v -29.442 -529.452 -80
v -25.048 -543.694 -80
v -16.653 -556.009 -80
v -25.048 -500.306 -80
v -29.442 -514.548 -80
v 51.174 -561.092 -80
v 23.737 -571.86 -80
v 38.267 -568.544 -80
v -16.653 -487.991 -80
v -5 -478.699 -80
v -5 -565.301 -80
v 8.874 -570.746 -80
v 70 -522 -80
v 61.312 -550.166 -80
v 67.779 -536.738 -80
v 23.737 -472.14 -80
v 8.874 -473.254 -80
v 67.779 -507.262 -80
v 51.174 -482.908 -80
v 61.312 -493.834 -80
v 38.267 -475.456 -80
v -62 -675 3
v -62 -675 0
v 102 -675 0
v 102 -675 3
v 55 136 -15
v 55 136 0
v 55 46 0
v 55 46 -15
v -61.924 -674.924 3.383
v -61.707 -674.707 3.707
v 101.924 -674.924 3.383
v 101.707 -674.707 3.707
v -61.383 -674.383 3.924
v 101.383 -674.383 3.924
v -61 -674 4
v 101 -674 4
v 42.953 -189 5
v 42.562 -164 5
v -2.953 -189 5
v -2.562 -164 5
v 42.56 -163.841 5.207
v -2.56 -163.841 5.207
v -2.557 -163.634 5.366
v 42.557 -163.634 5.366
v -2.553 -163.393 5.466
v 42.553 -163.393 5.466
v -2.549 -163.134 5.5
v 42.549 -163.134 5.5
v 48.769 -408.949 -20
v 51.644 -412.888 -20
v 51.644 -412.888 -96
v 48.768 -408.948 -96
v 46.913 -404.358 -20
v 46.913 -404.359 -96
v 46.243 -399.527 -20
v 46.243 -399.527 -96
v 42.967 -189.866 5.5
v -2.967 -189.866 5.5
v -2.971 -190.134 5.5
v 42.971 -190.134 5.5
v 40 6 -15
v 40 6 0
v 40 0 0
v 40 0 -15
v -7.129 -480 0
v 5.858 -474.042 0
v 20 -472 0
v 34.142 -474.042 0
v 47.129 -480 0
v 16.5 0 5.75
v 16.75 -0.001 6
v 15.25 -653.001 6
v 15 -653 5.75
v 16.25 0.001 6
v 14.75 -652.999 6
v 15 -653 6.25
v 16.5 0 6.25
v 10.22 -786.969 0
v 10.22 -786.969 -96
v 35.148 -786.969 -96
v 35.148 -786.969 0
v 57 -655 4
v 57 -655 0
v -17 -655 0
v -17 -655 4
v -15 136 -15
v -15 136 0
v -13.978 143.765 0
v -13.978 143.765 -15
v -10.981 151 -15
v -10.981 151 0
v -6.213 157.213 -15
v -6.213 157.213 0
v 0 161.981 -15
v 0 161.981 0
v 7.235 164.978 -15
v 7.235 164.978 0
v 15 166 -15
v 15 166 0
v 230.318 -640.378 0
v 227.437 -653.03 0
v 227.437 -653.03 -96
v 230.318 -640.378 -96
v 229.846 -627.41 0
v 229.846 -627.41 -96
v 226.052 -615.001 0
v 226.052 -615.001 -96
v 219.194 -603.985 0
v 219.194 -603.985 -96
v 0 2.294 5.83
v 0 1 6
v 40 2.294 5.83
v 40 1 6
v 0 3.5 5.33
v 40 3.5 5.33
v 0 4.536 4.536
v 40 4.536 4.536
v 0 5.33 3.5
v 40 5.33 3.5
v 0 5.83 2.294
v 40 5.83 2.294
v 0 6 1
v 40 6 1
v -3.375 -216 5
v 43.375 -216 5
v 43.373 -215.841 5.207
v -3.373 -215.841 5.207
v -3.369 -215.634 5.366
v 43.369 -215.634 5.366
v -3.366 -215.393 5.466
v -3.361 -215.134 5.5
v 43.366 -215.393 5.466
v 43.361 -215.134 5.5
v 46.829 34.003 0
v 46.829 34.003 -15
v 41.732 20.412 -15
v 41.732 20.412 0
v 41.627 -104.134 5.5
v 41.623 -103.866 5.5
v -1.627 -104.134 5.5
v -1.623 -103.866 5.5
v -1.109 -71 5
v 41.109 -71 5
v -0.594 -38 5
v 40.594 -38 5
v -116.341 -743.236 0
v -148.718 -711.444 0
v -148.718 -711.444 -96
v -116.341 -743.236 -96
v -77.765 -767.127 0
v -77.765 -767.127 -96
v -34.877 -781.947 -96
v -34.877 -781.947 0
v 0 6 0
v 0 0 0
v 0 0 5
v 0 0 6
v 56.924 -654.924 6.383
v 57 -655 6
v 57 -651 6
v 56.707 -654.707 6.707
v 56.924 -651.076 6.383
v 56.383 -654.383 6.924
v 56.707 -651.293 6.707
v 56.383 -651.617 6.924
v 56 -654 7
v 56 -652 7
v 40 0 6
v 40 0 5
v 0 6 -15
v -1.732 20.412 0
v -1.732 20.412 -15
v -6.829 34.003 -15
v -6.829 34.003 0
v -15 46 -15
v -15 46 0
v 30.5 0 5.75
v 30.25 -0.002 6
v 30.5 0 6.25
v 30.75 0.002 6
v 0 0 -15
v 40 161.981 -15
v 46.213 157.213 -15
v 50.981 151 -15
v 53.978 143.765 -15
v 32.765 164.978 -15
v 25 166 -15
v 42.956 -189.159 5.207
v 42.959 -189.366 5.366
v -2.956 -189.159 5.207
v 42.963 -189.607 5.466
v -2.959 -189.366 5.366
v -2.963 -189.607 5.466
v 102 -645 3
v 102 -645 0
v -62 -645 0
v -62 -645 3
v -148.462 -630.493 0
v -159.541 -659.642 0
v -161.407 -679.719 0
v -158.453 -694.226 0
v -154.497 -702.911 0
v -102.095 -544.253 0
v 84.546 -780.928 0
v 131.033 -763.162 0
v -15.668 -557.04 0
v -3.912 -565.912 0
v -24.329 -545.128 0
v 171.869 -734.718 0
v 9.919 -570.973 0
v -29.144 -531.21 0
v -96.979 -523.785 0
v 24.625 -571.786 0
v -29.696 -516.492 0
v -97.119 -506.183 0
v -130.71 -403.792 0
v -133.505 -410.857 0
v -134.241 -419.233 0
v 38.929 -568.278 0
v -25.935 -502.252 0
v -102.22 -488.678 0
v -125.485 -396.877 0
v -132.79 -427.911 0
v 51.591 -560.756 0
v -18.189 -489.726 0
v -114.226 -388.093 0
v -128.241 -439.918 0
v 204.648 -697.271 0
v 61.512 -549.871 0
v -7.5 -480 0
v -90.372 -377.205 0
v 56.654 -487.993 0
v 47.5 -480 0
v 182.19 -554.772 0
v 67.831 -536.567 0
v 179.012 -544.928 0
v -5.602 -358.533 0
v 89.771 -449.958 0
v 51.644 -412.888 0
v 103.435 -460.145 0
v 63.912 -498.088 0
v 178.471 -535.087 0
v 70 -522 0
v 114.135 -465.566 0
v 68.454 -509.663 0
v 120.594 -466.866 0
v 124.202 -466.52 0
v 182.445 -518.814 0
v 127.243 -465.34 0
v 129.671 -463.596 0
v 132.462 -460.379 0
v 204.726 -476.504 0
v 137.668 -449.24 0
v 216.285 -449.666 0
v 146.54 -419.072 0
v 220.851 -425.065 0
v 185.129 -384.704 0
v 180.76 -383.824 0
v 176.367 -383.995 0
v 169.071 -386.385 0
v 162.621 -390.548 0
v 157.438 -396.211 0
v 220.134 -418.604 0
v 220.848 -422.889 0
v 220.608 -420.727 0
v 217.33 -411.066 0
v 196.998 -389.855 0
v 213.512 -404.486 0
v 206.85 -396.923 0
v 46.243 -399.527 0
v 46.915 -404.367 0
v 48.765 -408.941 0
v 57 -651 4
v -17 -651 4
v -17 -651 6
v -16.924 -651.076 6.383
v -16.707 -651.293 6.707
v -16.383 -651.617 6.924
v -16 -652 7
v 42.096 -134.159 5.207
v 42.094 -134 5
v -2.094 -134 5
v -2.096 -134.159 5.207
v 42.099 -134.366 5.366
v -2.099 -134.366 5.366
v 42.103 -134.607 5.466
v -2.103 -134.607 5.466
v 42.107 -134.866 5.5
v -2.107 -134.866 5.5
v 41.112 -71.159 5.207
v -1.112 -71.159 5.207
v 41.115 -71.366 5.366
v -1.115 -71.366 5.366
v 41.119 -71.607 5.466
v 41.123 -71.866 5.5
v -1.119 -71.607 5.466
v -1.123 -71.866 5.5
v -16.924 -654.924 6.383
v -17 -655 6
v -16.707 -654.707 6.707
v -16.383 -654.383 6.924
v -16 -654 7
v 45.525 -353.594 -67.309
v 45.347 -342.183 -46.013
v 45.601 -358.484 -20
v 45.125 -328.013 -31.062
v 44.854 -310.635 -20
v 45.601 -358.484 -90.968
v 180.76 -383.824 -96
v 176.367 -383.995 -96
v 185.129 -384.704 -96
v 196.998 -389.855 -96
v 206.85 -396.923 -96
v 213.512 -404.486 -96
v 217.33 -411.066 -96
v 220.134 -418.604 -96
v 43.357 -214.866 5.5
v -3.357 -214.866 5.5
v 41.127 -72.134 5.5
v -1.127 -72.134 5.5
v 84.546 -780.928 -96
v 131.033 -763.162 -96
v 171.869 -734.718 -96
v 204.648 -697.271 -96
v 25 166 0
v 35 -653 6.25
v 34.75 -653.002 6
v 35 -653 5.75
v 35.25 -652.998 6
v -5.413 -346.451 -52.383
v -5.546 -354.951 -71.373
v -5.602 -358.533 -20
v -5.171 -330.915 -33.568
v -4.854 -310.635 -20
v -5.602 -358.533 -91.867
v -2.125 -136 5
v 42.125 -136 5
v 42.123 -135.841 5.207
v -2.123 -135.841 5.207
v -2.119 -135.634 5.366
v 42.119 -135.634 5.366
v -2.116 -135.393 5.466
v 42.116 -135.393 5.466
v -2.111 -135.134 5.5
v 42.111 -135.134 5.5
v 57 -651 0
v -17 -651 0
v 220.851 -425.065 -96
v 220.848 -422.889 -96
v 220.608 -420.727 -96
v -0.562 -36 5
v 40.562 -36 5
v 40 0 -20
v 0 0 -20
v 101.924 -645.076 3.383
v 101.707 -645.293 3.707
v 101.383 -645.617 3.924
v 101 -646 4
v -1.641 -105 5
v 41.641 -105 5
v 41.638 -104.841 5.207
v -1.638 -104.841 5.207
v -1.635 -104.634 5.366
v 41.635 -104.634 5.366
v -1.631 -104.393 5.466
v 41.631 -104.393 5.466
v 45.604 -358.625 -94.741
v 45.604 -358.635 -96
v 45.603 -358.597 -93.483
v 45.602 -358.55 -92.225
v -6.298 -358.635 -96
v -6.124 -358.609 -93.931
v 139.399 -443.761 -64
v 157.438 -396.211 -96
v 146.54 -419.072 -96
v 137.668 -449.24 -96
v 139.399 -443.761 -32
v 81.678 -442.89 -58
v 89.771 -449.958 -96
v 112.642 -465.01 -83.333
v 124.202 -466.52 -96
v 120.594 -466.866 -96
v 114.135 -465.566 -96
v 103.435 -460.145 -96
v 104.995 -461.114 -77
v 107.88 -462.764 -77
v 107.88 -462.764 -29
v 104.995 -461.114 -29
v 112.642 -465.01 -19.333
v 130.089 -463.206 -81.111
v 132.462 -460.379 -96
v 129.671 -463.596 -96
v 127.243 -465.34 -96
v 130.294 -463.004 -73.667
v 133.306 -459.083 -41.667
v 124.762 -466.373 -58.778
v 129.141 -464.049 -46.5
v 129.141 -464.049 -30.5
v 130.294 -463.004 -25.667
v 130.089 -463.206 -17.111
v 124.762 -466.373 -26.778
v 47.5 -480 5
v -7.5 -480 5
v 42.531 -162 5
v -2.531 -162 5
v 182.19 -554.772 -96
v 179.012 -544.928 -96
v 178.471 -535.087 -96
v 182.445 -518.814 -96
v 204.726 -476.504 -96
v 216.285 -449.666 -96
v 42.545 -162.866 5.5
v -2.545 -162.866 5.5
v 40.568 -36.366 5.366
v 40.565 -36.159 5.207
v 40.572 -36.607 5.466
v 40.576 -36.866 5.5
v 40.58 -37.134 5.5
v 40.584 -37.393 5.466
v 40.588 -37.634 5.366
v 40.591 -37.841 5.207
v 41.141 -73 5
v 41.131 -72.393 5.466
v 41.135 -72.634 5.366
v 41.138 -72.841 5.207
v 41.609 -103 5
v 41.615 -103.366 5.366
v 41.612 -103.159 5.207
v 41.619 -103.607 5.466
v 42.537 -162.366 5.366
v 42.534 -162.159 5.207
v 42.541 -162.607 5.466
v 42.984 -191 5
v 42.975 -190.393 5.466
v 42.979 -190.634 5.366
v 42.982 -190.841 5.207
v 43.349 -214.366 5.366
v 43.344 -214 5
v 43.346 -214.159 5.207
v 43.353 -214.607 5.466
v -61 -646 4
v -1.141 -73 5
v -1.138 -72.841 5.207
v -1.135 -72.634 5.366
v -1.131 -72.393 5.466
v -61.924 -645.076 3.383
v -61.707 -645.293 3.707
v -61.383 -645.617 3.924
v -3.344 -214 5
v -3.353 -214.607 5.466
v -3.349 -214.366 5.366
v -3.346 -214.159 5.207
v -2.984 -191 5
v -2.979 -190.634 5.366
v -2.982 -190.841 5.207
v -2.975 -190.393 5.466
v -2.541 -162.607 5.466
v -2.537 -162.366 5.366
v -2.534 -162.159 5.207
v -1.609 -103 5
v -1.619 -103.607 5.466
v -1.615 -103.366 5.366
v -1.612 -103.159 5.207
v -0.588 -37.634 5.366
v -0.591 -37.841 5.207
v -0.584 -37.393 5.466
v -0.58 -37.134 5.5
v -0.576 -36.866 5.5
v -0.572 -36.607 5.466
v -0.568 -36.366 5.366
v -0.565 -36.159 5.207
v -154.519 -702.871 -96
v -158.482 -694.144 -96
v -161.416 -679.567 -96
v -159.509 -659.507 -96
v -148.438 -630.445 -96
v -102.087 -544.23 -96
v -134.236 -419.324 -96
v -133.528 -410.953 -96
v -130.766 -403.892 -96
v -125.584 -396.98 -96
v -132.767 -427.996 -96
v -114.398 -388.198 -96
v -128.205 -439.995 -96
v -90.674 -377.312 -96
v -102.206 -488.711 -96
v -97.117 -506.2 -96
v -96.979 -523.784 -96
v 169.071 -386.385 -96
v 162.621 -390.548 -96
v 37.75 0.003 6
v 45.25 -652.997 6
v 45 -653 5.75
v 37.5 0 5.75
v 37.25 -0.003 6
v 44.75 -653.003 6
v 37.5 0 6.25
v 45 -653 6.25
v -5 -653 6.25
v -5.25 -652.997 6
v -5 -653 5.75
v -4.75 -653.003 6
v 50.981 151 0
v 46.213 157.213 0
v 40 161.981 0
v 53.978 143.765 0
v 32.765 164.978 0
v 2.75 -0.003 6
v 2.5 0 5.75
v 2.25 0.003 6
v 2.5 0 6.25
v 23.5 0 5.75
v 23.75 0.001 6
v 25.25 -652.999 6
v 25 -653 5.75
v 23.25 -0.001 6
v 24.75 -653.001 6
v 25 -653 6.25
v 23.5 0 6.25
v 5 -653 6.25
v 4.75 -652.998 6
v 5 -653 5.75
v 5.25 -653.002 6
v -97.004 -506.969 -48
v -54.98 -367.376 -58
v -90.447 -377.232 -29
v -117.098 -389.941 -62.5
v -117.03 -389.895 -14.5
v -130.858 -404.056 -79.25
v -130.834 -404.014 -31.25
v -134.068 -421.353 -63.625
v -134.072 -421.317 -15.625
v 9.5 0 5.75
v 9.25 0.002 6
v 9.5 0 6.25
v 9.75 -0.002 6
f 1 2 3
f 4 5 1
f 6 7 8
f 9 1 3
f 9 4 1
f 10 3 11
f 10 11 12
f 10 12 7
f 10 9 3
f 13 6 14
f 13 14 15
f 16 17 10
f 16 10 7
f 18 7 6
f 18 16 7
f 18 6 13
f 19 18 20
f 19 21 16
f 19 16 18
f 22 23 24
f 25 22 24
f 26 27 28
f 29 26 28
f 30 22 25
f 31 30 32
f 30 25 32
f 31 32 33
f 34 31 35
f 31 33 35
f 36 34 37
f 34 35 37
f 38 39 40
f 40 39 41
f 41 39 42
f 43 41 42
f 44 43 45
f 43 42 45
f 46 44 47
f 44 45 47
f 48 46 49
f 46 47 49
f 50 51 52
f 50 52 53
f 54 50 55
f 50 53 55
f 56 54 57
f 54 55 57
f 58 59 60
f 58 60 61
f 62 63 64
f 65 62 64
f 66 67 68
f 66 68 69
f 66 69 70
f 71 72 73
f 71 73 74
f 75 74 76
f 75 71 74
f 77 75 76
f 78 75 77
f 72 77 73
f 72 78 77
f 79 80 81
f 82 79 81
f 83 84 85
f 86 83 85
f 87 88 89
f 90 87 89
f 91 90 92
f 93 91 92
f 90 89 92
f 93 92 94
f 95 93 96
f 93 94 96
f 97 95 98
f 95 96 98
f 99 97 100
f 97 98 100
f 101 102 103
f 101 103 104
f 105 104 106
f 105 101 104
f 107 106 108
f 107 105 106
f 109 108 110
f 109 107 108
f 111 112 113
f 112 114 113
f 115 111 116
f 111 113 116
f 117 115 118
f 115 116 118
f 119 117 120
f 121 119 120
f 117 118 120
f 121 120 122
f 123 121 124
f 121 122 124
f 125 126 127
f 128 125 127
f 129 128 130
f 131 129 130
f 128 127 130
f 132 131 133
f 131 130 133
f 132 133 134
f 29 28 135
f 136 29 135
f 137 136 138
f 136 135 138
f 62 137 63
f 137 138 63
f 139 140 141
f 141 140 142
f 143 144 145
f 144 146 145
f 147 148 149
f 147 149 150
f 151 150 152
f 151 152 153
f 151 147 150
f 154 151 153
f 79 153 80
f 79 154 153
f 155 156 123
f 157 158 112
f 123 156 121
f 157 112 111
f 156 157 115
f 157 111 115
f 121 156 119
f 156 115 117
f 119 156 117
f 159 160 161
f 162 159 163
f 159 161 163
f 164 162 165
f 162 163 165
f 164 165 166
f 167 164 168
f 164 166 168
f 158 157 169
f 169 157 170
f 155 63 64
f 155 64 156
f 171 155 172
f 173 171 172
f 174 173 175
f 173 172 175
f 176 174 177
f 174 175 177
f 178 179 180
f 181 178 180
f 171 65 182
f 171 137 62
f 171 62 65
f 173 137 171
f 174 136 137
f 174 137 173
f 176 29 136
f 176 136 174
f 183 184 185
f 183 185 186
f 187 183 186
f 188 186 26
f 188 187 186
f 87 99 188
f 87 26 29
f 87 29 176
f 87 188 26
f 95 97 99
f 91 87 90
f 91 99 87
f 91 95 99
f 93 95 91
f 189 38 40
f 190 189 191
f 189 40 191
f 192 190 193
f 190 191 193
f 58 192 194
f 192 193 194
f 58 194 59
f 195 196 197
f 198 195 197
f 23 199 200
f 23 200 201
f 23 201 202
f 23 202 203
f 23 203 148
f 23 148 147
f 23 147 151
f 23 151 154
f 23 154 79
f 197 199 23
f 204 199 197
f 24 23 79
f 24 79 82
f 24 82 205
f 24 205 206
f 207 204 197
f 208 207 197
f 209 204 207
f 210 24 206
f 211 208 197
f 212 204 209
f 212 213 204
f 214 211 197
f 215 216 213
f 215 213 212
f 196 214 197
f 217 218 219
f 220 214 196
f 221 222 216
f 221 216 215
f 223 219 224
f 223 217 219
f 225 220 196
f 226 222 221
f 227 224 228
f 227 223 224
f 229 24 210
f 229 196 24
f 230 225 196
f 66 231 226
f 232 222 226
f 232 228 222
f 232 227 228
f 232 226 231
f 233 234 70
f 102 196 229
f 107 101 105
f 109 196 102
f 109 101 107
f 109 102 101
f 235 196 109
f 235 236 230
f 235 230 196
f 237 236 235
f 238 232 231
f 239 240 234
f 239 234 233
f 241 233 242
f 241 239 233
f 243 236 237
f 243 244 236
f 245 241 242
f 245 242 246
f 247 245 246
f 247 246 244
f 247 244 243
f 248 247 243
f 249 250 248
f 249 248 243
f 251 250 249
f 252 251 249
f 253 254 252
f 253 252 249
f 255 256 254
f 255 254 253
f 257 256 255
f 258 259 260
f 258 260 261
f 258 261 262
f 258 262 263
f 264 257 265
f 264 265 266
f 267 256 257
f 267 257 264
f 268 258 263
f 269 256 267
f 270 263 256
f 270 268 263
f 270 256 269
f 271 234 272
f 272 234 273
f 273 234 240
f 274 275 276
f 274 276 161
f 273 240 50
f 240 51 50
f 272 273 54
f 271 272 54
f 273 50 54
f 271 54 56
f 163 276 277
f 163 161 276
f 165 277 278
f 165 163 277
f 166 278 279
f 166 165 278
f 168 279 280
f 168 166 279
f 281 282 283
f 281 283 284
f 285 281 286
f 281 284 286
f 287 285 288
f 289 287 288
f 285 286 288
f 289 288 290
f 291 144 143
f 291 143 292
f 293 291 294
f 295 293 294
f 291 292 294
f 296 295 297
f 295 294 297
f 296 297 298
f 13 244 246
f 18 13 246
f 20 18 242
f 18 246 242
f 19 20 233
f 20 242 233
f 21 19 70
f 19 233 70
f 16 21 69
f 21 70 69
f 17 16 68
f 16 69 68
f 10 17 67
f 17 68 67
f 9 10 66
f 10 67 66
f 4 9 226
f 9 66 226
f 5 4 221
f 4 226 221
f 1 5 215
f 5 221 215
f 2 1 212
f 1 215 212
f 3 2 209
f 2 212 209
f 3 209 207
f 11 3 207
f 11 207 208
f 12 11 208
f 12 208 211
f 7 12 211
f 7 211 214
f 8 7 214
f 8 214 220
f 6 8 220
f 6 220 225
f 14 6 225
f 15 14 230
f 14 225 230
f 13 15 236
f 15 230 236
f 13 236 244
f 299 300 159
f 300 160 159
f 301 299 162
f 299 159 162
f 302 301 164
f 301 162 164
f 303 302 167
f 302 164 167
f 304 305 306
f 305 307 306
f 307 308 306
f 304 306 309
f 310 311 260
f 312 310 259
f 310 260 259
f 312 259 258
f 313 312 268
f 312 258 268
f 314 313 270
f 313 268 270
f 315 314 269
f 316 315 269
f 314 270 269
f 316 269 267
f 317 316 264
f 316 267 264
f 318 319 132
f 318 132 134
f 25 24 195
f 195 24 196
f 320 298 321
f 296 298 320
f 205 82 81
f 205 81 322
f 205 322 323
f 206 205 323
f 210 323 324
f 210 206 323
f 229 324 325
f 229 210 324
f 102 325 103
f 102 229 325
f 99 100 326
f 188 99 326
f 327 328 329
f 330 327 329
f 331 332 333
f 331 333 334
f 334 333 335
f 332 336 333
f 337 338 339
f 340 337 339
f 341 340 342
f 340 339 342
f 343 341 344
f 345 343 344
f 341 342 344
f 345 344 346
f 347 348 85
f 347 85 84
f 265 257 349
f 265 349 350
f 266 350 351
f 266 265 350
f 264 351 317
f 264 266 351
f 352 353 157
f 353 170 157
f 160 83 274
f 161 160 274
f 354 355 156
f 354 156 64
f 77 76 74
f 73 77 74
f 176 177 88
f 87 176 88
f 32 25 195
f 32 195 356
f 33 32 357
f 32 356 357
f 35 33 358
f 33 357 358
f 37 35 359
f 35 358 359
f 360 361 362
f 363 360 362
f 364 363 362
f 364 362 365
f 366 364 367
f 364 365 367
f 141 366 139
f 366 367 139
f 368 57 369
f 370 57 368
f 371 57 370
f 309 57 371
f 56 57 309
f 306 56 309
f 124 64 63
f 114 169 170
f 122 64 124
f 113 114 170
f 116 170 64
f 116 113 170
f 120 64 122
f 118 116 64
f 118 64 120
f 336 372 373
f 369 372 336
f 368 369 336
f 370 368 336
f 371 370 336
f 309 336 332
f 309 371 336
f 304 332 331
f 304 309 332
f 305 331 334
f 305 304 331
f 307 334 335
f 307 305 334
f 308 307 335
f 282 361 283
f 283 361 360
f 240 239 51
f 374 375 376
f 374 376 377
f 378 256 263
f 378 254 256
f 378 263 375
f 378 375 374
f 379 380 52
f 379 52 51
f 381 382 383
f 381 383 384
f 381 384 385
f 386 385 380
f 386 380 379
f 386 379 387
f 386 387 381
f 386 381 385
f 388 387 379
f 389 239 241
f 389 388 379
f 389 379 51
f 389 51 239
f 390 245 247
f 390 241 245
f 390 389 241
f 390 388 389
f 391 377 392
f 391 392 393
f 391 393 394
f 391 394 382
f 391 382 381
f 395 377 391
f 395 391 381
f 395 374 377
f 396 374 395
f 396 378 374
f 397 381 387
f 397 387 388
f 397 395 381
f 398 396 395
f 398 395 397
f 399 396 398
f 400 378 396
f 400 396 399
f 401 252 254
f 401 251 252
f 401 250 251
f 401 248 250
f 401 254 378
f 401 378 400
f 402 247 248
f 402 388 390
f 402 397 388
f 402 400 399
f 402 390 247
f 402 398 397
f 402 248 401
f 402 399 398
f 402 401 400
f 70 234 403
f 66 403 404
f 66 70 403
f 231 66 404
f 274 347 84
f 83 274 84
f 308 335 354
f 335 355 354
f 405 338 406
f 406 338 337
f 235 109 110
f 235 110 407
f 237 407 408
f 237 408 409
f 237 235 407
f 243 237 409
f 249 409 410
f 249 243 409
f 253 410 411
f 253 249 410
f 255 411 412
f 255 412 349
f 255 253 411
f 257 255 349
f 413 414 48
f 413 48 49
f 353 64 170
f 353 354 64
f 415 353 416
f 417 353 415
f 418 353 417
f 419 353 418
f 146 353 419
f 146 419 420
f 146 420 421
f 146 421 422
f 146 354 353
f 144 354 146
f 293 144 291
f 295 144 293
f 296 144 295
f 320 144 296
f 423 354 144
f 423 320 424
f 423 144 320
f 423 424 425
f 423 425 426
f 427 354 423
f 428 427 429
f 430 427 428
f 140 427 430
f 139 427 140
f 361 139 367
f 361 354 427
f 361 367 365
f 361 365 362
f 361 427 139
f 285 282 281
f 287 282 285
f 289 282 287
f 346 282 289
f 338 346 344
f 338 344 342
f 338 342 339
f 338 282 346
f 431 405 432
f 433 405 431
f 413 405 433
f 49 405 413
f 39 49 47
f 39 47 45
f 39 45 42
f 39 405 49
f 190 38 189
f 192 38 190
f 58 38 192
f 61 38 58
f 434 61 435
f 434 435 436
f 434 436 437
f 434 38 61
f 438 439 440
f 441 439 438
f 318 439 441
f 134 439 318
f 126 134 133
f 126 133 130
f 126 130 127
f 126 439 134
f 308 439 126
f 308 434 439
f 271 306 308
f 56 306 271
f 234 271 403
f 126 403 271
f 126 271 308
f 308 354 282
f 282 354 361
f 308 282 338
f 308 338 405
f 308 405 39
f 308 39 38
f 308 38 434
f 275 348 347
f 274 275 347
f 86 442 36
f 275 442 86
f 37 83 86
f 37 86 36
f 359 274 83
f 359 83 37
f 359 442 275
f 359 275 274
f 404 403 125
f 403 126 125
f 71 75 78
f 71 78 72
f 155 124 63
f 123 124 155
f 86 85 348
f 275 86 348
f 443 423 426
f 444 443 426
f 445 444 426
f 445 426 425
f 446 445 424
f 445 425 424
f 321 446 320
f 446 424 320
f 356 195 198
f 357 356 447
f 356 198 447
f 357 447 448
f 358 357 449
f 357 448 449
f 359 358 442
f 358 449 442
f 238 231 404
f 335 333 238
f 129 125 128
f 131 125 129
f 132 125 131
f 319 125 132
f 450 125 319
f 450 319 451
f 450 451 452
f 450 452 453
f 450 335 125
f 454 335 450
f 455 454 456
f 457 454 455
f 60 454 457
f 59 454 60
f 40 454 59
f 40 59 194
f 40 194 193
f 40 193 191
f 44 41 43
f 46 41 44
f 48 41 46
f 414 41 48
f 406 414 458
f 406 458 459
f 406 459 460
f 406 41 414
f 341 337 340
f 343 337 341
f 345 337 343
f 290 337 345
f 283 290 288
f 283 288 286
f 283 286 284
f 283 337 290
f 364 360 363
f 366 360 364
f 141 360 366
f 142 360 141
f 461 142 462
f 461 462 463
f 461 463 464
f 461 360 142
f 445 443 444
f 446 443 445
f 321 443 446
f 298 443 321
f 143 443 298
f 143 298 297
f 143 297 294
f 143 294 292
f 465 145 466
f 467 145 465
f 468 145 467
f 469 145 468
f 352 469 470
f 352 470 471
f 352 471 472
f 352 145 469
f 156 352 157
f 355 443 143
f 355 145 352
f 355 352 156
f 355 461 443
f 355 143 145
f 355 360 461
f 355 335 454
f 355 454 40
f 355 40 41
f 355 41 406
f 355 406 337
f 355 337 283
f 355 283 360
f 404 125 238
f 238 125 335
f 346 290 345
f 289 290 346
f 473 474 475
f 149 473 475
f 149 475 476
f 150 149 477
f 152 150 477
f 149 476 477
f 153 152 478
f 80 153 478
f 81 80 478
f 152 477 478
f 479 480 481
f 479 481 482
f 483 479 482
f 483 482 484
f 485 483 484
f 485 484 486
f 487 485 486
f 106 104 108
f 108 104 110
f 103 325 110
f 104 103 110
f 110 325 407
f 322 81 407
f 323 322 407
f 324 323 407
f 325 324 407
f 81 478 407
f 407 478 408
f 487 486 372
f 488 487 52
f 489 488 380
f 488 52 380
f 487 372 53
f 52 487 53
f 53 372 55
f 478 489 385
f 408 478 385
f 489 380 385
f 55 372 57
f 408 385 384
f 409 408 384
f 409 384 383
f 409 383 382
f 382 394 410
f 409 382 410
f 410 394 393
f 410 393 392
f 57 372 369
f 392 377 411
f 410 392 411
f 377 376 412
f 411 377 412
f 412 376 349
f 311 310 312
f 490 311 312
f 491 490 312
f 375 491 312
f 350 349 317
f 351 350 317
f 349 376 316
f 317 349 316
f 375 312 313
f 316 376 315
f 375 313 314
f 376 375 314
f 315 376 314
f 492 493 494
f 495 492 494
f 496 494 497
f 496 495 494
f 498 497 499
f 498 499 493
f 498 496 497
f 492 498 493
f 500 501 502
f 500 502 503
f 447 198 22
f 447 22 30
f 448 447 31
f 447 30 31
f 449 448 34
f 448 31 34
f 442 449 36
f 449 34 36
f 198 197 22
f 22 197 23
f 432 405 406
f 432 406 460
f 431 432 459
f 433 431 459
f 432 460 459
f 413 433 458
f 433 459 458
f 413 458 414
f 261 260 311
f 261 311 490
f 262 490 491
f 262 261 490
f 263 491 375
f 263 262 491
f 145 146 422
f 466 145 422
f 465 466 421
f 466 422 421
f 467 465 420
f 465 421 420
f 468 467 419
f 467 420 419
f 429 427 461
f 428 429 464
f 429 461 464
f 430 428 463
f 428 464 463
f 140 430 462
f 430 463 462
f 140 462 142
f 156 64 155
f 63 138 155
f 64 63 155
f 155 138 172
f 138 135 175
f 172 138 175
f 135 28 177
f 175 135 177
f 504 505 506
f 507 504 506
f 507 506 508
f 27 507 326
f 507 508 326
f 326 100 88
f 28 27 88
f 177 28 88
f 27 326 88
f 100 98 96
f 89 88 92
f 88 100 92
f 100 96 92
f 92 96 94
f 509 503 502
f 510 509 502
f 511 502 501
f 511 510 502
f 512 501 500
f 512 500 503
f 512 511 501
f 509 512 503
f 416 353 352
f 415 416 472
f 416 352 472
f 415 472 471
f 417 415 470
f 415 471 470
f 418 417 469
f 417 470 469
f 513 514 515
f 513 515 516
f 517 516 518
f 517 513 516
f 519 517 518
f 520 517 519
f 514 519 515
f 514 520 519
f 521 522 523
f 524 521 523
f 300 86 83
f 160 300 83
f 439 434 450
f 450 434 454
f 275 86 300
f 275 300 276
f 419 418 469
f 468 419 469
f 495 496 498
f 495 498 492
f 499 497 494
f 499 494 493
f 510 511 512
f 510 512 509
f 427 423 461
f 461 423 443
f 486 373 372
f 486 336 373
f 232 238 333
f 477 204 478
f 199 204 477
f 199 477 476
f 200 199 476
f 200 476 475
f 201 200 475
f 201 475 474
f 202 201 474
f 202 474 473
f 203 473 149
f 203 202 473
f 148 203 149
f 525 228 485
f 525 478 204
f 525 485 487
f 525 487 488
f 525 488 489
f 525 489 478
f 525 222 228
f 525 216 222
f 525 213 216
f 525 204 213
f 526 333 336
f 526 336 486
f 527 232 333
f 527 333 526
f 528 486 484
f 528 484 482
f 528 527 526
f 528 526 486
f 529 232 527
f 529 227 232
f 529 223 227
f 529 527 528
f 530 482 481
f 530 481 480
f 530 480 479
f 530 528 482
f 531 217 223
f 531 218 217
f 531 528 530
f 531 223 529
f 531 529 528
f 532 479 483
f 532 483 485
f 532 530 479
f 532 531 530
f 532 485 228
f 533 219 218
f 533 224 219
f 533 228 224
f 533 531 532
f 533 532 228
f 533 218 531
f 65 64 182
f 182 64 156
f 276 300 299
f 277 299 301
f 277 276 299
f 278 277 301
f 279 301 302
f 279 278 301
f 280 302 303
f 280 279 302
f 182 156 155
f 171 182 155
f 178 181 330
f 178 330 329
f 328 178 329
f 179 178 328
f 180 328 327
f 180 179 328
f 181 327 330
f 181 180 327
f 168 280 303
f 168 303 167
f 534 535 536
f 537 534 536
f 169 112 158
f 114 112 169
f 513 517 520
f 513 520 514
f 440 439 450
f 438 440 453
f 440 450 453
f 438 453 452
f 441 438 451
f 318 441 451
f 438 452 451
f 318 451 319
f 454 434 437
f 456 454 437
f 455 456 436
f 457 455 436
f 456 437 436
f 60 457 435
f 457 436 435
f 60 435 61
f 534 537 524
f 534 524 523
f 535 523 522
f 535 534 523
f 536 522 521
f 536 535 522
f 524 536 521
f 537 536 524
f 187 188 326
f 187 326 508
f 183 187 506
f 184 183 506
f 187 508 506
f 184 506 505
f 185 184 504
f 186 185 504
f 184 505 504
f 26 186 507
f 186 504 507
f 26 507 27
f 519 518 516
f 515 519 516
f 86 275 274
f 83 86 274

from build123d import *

# Parameters (mm, degrees)
BOSS_EXTRUDE1_DEPTH  = 20
BOSS_EXTRUDE2_DEPTH  = 96
FILLET3_R            = 20
BOSS_EXTRUDE3_DEPTH  = 5
BOSS_EXTRUDE4_DEPTH  = 96
CHAMFER1_SIZE        = 48
CUT_EXTRUDE1_DEPTH   = 55
SKETCH28_R           = 50
CUT_EXTRUDE14_DEPTH  = 80
BOSS_EXTRUDE18_DEPTH = 0.5
FILLET31_R           = 1
SKETCH32_W           = 40
SKETCH32_H           = 6
BOSS_EXTRUDE19_DEPTH = 1
SKETCH33_W           = 40
SKETCH33_H           = 6
BOSS_EXTRUDE20_DEPTH = 5
FILLET32_R           = 5
BOSS_EXTRUDE21_DEPTH = 4
SKETCH35_W           = 74
SKETCH35_H           = 4
BOSS_EXTRUDE22_DEPTH = 3
FILLET33_R           = 1
FILLET34_R           = 1
BOSS_EXTRUDE23_DEPTH = 15
SWEEP9_PROFILE_R     = 0.25
SWEEP14_PROFILE_R    = 0.25
SWEEP15_PROFILE_R    = 0.25
SWEEP16_PROFILE_R    = 0.25
SWEEP17_PROFILE_R    = 0.25
SWEEP18_PROFILE_R    = 0.25


with BuildPart() as part:
    # Sketch1 → Boss-Extrude1 (new body)
    with BuildSketch(Plane.XY):
        Polygon((40, 0), (0, 0), (-7.5, -480), (0, -480), (20, -480), (40, -480), (47.5, -480), align=None)
    extrude(amount=-BOSS_EXTRUDE1_DEPTH)

    # Sketch2 → Boss-Extrude2 (add)
    with BuildSketch(Plane.XY):
        with BuildLine():
            Line((10.219610861, -786.968604214), (35.14770821, -786.968604214))
            ThreePointArc((35.14770821, -786.968604214), (152.317235778, -750.183650537), (227.437244868, -653.030085282))
            ThreePointArc((227.437244868, -653.030085282), (229.845672292, -627.410065854), (219.193591135, -603.98531217))
            add(Edge.make_bspline(
                [(219.193591135, -603.98531217), (202.390568913, -583.503251259), (147.151942297, -529.611408553), (218.152428529, -476.200616028), (220.851380358, -425.0648756)],
                knots=[0.199231014, 0.199231014, 0.199231014, 0.199231014, 0.323150604, 0.537684641, 0.537684641, 0.537684641, 0.537684641], degree=3))
            ThreePointArc((220.851380358, -425.0648756), (220.757173483, -421.804982868), (220.134421907, -418.603739978))
            add(Edge.make_bspline(
                [(176.366999248, -383.995427543), (180.66359913, -383.177159069), (200.057343412, -388.929095367), (215.470049543, -401.99312039), (220.134421907, -418.603739978)],
                knots=[0.180916706, 0.180916706, 0.180916706, 0.180916706, 0.355528149, 0.960011037, 0.960011037, 0.960011037, 0.960011037], degree=3))
            ThreePointArc((176.366999248, -383.995427543), (165.712415207, -388.258961345), (157.438208459, -396.211029268))
            add(Edge.make_bspline(
                [(157.438208459, -396.211029268), (126.925707927, -439.608771107), (154.816116558, -524.862903433), (46.362546103, -407.202950609)],
                knots=[0.793265859, 0.793265859, 0.793265859, 0.793265859, 1, 1, 1, 1], degree=3))
            Line((46.362546103, -407.202950609), (45.60131722, -358.484302107))
            Line((45.60131722, -358.484302107), (-5.264752066, -358.484302107))
            add(Edge.make_bspline(
                [(-5.264752066, -358.484302107), (-217.82456269, -389.343935587), (15.057561493, -504.241037009), (-198.228031957, -649.372190009), (-148.717501724, -711.44444846)],
                knots=[0, 0, 0, 0, 0.481381152, 1, 1, 1, 1], degree=3))
            ThreePointArc((-148.717501724, -711.44444846), (-77.764626164, -767.127384819), (10.219610861, -786.968604214))
        make_face()
    extrude(amount=-BOSS_EXTRUDE2_DEPTH)

    # Fillet3
    fillet3_edges = [part.edges().sort_by_distance(p)[0] for p in [
        (46.362546103, -407.202950609, -48),
    ]]
    fillet(fillet3_edges, radius=FILLET3_R)

    # Sketch4 → Boss-Extrude3 (add)
    with BuildSketch(Plane.XY):
        Polygon((-7.5, -480), (0, 0), (40, 0), (47.5, -480), align=None)
    extrude(amount=BOSS_EXTRUDE3_DEPTH)

    # Sketch5 → Boss-Extrude4 (add)
    with BuildSketch(Plane.XY):
        Polygon((45.60131722, -358.484302107), (-5.264752066, -358.484302107), (-5.602083381, -358.533336367), (-4.853669592, -310.634853862), (44.853669592, -310.634853862), align=None)
    extrude(amount=-BOSS_EXTRUDE4_DEPTH)

    # Chamfer1
    # the kernel refuses this chamfer: 48 mm, written as the material it takes off along each edge
    with BuildSketch(Plane(origin=(-128.294453014, -310.634853862, -96), x_dir=(0, -0.9996219169112968, -0.02749587661058648), z_dir=(1, 0, 0))) as chamfer1_piece_1:
        Polygon((CHAMFER1_SIZE * 0.999621916911, -CHAMFER1_SIZE * 0.0274958766106), (-CHAMFER1_SIZE * 0.0274958766106, -CHAMFER1_SIZE * 0.999621916911), (0, 0), align=None)
    extrude(amount=296.588906028, mode=Mode.SUBTRACT)

    # Sketch7 → Cut-Extrude1 (cut, symmetric)
    with BuildSketch(Plane(origin=(0, 0, 0), x_dir=(0, 0, -1), z_dir=(1, 0, 0))):
        with BuildLine():
            ThreePointArc((96, -358.634853862), (51.055589892, -345.630169867), (20, -310.634853862))
            Line((20, -310.634853862), (96, -310.634853862))
            Line((96, -310.634853862), (96, -358.634853862))
        make_face()
    extrude(amount=CUT_EXTRUDE1_DEPTH, both=True, mode=Mode.SUBTRACT)

    # Sketch28 → Cut-Extrude14 (cut)
    with BuildSketch(Plane.XY):
        with Locations((20, -522)):
            Circle(SKETCH28_R)
    extrude(amount=-CUT_EXTRUDE14_DEPTH, mode=Mode.SUBTRACT)

    # Sketch30 → Boss-Extrude18 (add)
    with BuildSketch(Plane.XY.offset(5)):
        Polygon((0, -162), (-2.53125, -162), (-2.5625, -164), (0, -164), (40.59375, -164), (42.5625, -164), (42.53125, -162), (40.59375, -162), align=None)
        Polygon((39.752435227, -36), (40.5625, -36), (40.59375, -38), (39.752435227, -38), (0, -38), (-0.59375, -38), (-0.5625, -36), (0, -36), align=None)
        Polygon((0, -71), (-1.109375, -71), (-1.140625, -73), (0, -73), (39.752435227, -73), (41.140625, -73), (41.109375, -71), (39.752435227, -71), align=None)
        Polygon((39.752435227, -103), (41.609375, -103), (41.640625, -105), (39.752435227, -105), (0, -105), (-1.640625, -105), (-1.609375, -103), (0, -103), align=None)
        Polygon((0, -134), (-2.09375, -134), (-2.125, -136), (0, -136), (40.59375, -136), (42.125, -136), (42.09375, -134), (40.59375, -134), align=None)
        Polygon((0, -189), (-2.953125, -189), (-2.984375, -191), (0, -191), (39.752435227, -191), (42.984375, -191), (42.953125, -189), (39.752435227, -189), align=None)
        Polygon((0, -214), (-3.34375, -214), (-3.375, -216), (0, -216), (40.59375, -216), (43.375, -216), (43.34375, -214), (40.59375, -214), align=None)
    extrude(amount=BOSS_EXTRUDE18_DEPTH)

    # Fillet31
    # the kernel refuses this fillet: 1 mm, written as the material it takes off along each edge
    with BuildSketch(Plane(origin=(45.540063509, -216, 5.5), x_dir=(0, 0, -1), z_dir=(-1, 0, 0))) as fillet31_piece_1:
        with BuildLine():
            CenterArc((1, -0.866025404), FILLET31_R, 120, 60)
            Line((0, -0.866025404), (-0.02, -0.866025404))
            Line((-0.02, -0.866025404), (-0.02, 0))
            Line((-0.02, 0), (0, 0.02))
            ThreePointArc((0, 0.02), (0.25, 0.02), (0.49, 0.017320508))
            Line((0.49, 0.017320508), (0.5, 0))
        make_face()
    extrude(amount=51.080127019, mode=Mode.SUBTRACT)
    with BuildSketch(Plane(origin=(-5.508813509, -214, 5.5), x_dir=(0, 0, -1), z_dir=(1, 0, 0))) as fillet31_piece_2:
        with BuildLine():
            CenterArc((1, -0.866025404), FILLET31_R, 120, 60)
            Line((0, -0.866025404), (-0.02, -0.866025404))
            Line((-0.02, -0.866025404), (-0.02, 0))
            Line((-0.02, 0), (0, 0.02))
            ThreePointArc((0, 0.02), (0.25, 0.02), (0.49, 0.017320508))
            Line((0.49, 0.017320508), (0.5, 0))
        make_face()
    extrude(amount=51.017627019, mode=Mode.SUBTRACT)
    with BuildSketch(Plane(origin=(45.149438509, -191, 5.5), x_dir=(0, 0, -1), z_dir=(-1, 0, 0))) as fillet31_piece_3:
        with BuildLine():
            CenterArc((1, -0.866025404), FILLET31_R, 120, 60)
            Line((0, -0.866025404), (-0.02, -0.866025404))
            Line((-0.02, -0.866025404), (-0.02, 0))
            Line((-0.02, 0), (0, 0.02))
            ThreePointArc((0, 0.02), (0.25, 0.02), (0.49, 0.017320508))
            Line((0.49, 0.017320508), (0.5, 0))
        make_face()
    extrude(amount=50.298877019, mode=Mode.SUBTRACT)
    with BuildSketch(Plane(origin=(-5.118188509, -189, 5.5), x_dir=(0, 0, -1), z_dir=(1, 0, 0))) as fillet31_piece_4:
        with BuildLine():
            CenterArc((1, -0.866025404), FILLET31_R, 120, 60)
            Line((0, -0.866025404), (-0.02, -0.866025404))
            Line((-0.02, -0.866025404), (-0.02, 0))
            Line((-0.02, 0), (0, 0.02))
            ThreePointArc((0, 0.02), (0.25, 0.02), (0.49, 0.017320508))
            Line((0.49, 0.017320508), (0.5, 0))
        make_face()
    extrude(amount=50.236377019, mode=Mode.SUBTRACT)
    with BuildSketch(Plane(origin=(44.727563509, -164, 5.5), x_dir=(0, 0, -1), z_dir=(-1, 0, 0))) as fillet31_piece_5:
        with BuildLine():
            CenterArc((1, -0.866025404), FILLET31_R, 120, 60)
            Line((0, -0.866025404), (-0.02, -0.866025404))
            Line((-0.02, -0.866025404), (-0.02, 0))
            Line((-0.02, 0), (0, 0.02))
            ThreePointArc((0, 0.02), (0.25, 0.02), (0.49, 0.017320508))
            Line((0.49, 0.017320508), (0.5, 0))
        make_face()
    extrude(amount=49.455127019, mode=Mode.SUBTRACT)
    with BuildSketch(Plane(origin=(-4.696313509, -162, 5.5), x_dir=(0, 0, -1), z_dir=(1, 0, 0))) as fillet31_piece_6:
        with BuildLine():
            CenterArc((1, -0.866025404), FILLET31_R, 120, 60)
            Line((0, -0.866025404), (-0.02, -0.866025404))
            Line((-0.02, -0.866025404), (-0.02, 0))
            Line((-0.02, 0), (0, 0.02))
            ThreePointArc((0, 0.02), (0.25, 0.02), (0.49, 0.017320508))
            Line((0.49, 0.017320508), (0.5, 0))
        make_face()
    extrude(amount=49.392627019, mode=Mode.SUBTRACT)
    with BuildSketch(Plane(origin=(44.290063509, -136, 5.5), x_dir=(0, 0, -1), z_dir=(-1, 0, 0))) as fillet31_piece_7:
        with BuildLine():
            CenterArc((1, -0.866025404), FILLET31_R, 120, 60)
            Line((0, -0.866025404), (-0.02, -0.866025404))
            Line((-0.02, -0.866025404), (-0.02, 0))
            Line((-0.02, 0), (0, 0.02))
            ThreePointArc((0, 0.02), (0.25, 0.02), (0.49, 0.017320508))
            Line((0.49, 0.017320508), (0.5, 0))
        make_face()
    extrude(amount=48.580127019, mode=Mode.SUBTRACT)
    with BuildSketch(Plane(origin=(-4.258813509, -134, 5.5), x_dir=(0, 0, -1), z_dir=(1, 0, 0))) as fillet31_piece_8:
        with BuildLine():
            CenterArc((1, -0.866025404), FILLET31_R, 120, 60)
            Line((0, -0.866025404), (-0.02, -0.866025404))
            Line((-0.02, -0.866025404), (-0.02, 0))
            Line((-0.02, 0), (0, 0.02))
            ThreePointArc((0, 0.02), (0.25, 0.02), (0.49, 0.017320508))
            Line((0.49, 0.017320508), (0.5, 0))
        make_face()
    extrude(amount=48.517627019, mode=Mode.SUBTRACT)
    with BuildSketch(Plane(origin=(43.805688509, -105, 5.5), x_dir=(0, 0, -1), z_dir=(-1, 0, 0))) as fillet31_piece_9:
        with BuildLine():
            CenterArc((1, -0.866025404), FILLET31_R, 120, 60)
            Line((0, -0.866025404), (-0.02, -0.866025404))
            Line((-0.02, -0.866025404), (-0.02, 0))
            Line((-0.02, 0), (0, 0.02))
            ThreePointArc((0, 0.02), (0.25, 0.02), (0.49, 0.017320508))
            Line((0.49, 0.017320508), (0.5, 0))
        make_face()
    extrude(amount=47.611377019, mode=Mode.SUBTRACT)
    with BuildSketch(Plane(origin=(-3.774438509, -103, 5.5), x_dir=(0, 0, -1), z_dir=(1, 0, 0))) as fillet31_piece_10:
        with BuildLine():
            CenterArc((1, -0.866025404), FILLET31_R, 120, 60)
            Line((0, -0.866025404), (-0.02, -0.866025404))
            Line((-0.02, -0.866025404), (-0.02, 0))
            Line((-0.02, 0), (0, 0.02))
            ThreePointArc((0, 0.02), (0.25, 0.02), (0.49, 0.017320508))
            Line((0.49, 0.017320508), (0.5, 0))
        make_face()
    extrude(amount=47.548877019, mode=Mode.SUBTRACT)
    with BuildSketch(Plane(origin=(43.305688509, -73, 5.5), x_dir=(0, 0, -1), z_dir=(-1, 0, 0))) as fillet31_piece_11:
        with BuildLine():
            CenterArc((1, -0.866025404), FILLET31_R, 120, 60)
            Line((0, -0.866025404), (-0.02, -0.866025404))
            Line((-0.02, -0.866025404), (-0.02, 0))
            Line((-0.02, 0), (0, 0.02))
            ThreePointArc((0, 0.02), (0.25, 0.02), (0.49, 0.017320508))
            Line((0.49, 0.017320508), (0.5, 0))
        make_face()
    extrude(amount=46.611377019, mode=Mode.SUBTRACT)
    with BuildSketch(Plane(origin=(-3.274438509, -71, 5.5), x_dir=(0, 0, -1), z_dir=(1, 0, 0))) as fillet31_piece_12:
        with BuildLine():
            CenterArc((1, -0.866025404), FILLET31_R, 120, 60)
            Line((0, -0.866025404), (-0.02, -0.866025404))
            Line((-0.02, -0.866025404), (-0.02, 0))
            Line((-0.02, 0), (0, 0.02))
            ThreePointArc((0, 0.02), (0.25, 0.02), (0.49, 0.017320508))
            Line((0.49, 0.017320508), (0.5, 0))
        make_face()
    extrude(amount=46.548877019, mode=Mode.SUBTRACT)
    with BuildSketch(Plane(origin=(42.758813509, -38, 5.5), x_dir=(0, 0, -1), z_dir=(-1, 0, 0))) as fillet31_piece_13:
        with BuildLine():
            CenterArc((1, -0.866025404), FILLET31_R, 120, 60)
            Line((0, -0.866025404), (-0.02, -0.866025404))
            Line((-0.02, -0.866025404), (-0.02, 0))
            Line((-0.02, 0), (0, 0.02))
            ThreePointArc((0, 0.02), (0.25, 0.02), (0.49, 0.017320508))
            Line((0.49, 0.017320508), (0.5, 0))
        make_face()
    extrude(amount=45.517627019, mode=Mode.SUBTRACT)
    with BuildSketch(Plane(origin=(-2.727563509, -36, 5.5), x_dir=(0, 0, -1), z_dir=(1, 0, 0))) as fillet31_piece_14:
        with BuildLine():
            CenterArc((1, -0.866025404), FILLET31_R, 120, 60)
            Line((0, -0.866025404), (-0.02, -0.866025404))
            Line((-0.02, -0.866025404), (-0.02, 0))
            Line((-0.02, 0), (0, 0.02))
            ThreePointArc((0, 0.02), (0.25, 0.02), (0.49, 0.017320508))
            Line((0.49, 0.017320508), (0.5, 0))
        make_face()
    extrude(amount=45.455127019, mode=Mode.SUBTRACT)



with BuildPart() as body_2:
    # Sketch32 → Boss-Extrude19 (new body)
    with BuildSketch(Plane.XY.offset(5)):
        with Locations((20, 3)):
            Rectangle(SKETCH32_W, SKETCH32_H)
    extrude(amount=BOSS_EXTRUDE19_DEPTH)


with BuildPart() as part_1:
    add(part.part)

    add(body_2.part)  # Boss-Extrude20 merges body 2
    # Sketch33 → Boss-Extrude20 (add)
    with BuildSketch(Plane(origin=(0, 0, 5), x_dir=(-1, 0, 0), z_dir=(0, 0, -1))):
        with Locations((-20, 3)):
            Rectangle(SKETCH33_W, SKETCH33_H)
    extrude(amount=BOSS_EXTRUDE20_DEPTH)

    # Fillet32
    fillet32_edges = [part_1.edges().sort_by_distance(p)[0] for p in [
        (20, 6, 6),
    ]]
    fillet(fillet32_edges, radius=FILLET32_R)

    # Sketch34 → Boss-Extrude21 (add)
    with BuildSketch(Plane.XY):
        Polygon((102, -645), (20, -645), (-17, -645), (-62, -645), (-62, -675), (102, -675), align=None)
        Polygon((-17, -651), (20, -651), (57, -651), (57, -655), (-17, -655), align=None, mode=Mode.SUBTRACT)
    extrude(amount=BOSS_EXTRUDE21_DEPTH)

    # Fillet33
    fillet33_edges = [part_1.edges().sort_by_distance(p)[0] for p in [
        (20, -645, 4),
        (20, -675, 4),
        (102, -660, 4),
        (-62, -660, 4),
    ]]
    fillet(fillet33_edges, radius=FILLET33_R)


with BuildPart() as body_2_2:
    # Sketch35 → Boss-Extrude22 (new body)
    with BuildSketch(Plane.XY.offset(4)):
        with Locations((20, -653)):
            Rectangle(SKETCH35_W, SKETCH35_H)
    extrude(amount=BOSS_EXTRUDE22_DEPTH)

    # Fillet34
    fillet34_edges = [body_2_2.edges().sort_by_distance(p)[0] for p in [
        (57, -653, 7),
        (20, -651, 7),
        (-17, -653, 7),
        (20, -655, 7),
    ]]
    fillet(fillet34_edges, radius=FILLET34_R)


with BuildPart() as body_3:
    # Sketch44 → Boss-Extrude23 (new body)
    with BuildSketch(Plane(origin=(0, 0, 0), x_dir=(-1, 0, 0), z_dir=(0, 0, -1))):
        with BuildLine():
            Line((-40, 0), (0, 0))
            Line((0, 0), (0, 6))
            ThreePointArc((0, 6), (3.873308365, 27.360009363), (15, 46))
            Line((15, 46), (15, 136))
            ThreePointArc((15, 136), (6.213203436, 157.213203436), (-15, 166))
            Line((-15, 166), (-25, 166))
            ThreePointArc((-25, 166), (-46.213203436, 157.213203436), (-55, 136))
            Line((-55, 136), (-55, 46))
            ThreePointArc((-55, 46), (-43.873308365, 27.360009363), (-40, 6))
            Line((-40, 6), (-40, 0))
        make_face()
    extrude(amount=BOSS_EXTRUDE23_DEPTH)


with BuildPart() as body_4:
    # Sweep9: sweep along a path in Sketch46
    with BuildLine(Plane(origin=(0, 0, 6), x_dir=(-1, 0, 0), z_dir=(0, 0, -1))) as sweep9_path:
        Line((5, -653), (-2.5, 0))
    # Sweep9 profile (on start of the path) → Sweep9 (sweep)
    with BuildSketch(Plane(origin=(-5, -653, 6), x_dir=(0.9999340487238518, -0.011484694280901693, 0), z_dir=(0.011484694280901693, 0.9999340487238518, 0))):
        Circle(SWEEP9_PROFILE_R)
    sweep(path=sweep9_path.line)


with BuildPart() as body_5:
    # Sweep14: sweep along a path in Sketch110
    with BuildLine(Plane(origin=(0, 0, 6), x_dir=(-1, 0, 0), z_dir=(0, 0, -1))) as sweep14_path:
        Line((-5, -653), (-9.5, 0))
    # Sweep14 profile (on start of the path) → Sweep14 (sweep)
    with BuildSketch(Plane(origin=(5, -653, 6), x_dir=(0.9999762560373022, -0.006891107430578526, 0), z_dir=(0.006891107430578526, 0.9999762560373022, 0))):
        Circle(SWEEP14_PROFILE_R)
    sweep(path=sweep14_path.line)


with BuildPart() as body_6:
    # Sweep15: sweep along a path in Sketch125
    with BuildLine(Plane(origin=(0, 0, 6), x_dir=(-1, 0, 0), z_dir=(0, 0, -1))) as sweep15_path:
        Line((-15, -653), (-16.5, 0))
    # Sweep15 profile (on start of the path) → Sweep15 (sweep)
    with BuildSketch(Plane(origin=(15, -653, 6), x_dir=(0.9999973616983979, -0.0022970842918032365, 0), z_dir=(0.0022970842918032365, 0.9999973616983979, 0))):
        Circle(SWEEP15_PROFILE_R)
    sweep(path=sweep15_path.line)


with BuildPart() as body_7:
    # Sweep16: sweep along a path in Sketch132
    with BuildLine(Plane(origin=(0, 0, 6), x_dir=(-1, 0, 0), z_dir=(0, 0, -1))) as sweep16_path:
        Line((-25, -653), (-23.5, 0))
    # Sweep16 profile (on start of the path) → Sweep16 (sweep)
    with BuildSketch(Plane(origin=(25, -653, 6), x_dir=(0.9999973616983979, 0.002297084291803495, 0), z_dir=(-0.002297084291803495, 0.9999973616983979, 0))):
        Circle(SWEEP16_PROFILE_R)
    sweep(path=sweep16_path.line)


with BuildPart() as body_8:
    # Sweep17: sweep along a path in Sketch139
    with BuildLine(Plane(origin=(0, 0, 6), x_dir=(-1, 0, 0), z_dir=(0, 0, -1))) as sweep17_path:
        Line((-35, -653), (-30.5, 0))
    # Sweep17 profile (on start of the path) → Sweep17 (sweep)
    with BuildSketch(Plane(origin=(35, -653, 6), x_dir=(0.9999762560373022, 0.006891107430578783, 0), z_dir=(-0.006891107430578783, 0.9999762560373022, 0))):
        Circle(SWEEP17_PROFILE_R)
    sweep(path=sweep17_path.line)


with BuildPart() as body_9:
    # Sweep18: sweep along a path in Sketch146
    with BuildLine(Plane(origin=(0, 0, 6), x_dir=(-1, 0, 0), z_dir=(0, 0, -1))) as sweep18_path:
        Line((-45, -653), (-37.5, 0))
    # Sweep18 profile (on start of the path) → Sweep18 (sweep)
    with BuildSketch(Plane(origin=(45, -653, 6), x_dir=(0.9999340487238518, 0.011484694280901951, 0), z_dir=(-0.011484694280901951, 0.9999340487238518, 0))):
        Circle(SWEEP18_PROFILE_R)
    sweep(path=sweep18_path.line)


solid = Compound([part_1.part, body_2_2.part, body_3.part, body_4.part, body_5.part, body_6.part, body_7.part, body_8.part, body_9.part])
